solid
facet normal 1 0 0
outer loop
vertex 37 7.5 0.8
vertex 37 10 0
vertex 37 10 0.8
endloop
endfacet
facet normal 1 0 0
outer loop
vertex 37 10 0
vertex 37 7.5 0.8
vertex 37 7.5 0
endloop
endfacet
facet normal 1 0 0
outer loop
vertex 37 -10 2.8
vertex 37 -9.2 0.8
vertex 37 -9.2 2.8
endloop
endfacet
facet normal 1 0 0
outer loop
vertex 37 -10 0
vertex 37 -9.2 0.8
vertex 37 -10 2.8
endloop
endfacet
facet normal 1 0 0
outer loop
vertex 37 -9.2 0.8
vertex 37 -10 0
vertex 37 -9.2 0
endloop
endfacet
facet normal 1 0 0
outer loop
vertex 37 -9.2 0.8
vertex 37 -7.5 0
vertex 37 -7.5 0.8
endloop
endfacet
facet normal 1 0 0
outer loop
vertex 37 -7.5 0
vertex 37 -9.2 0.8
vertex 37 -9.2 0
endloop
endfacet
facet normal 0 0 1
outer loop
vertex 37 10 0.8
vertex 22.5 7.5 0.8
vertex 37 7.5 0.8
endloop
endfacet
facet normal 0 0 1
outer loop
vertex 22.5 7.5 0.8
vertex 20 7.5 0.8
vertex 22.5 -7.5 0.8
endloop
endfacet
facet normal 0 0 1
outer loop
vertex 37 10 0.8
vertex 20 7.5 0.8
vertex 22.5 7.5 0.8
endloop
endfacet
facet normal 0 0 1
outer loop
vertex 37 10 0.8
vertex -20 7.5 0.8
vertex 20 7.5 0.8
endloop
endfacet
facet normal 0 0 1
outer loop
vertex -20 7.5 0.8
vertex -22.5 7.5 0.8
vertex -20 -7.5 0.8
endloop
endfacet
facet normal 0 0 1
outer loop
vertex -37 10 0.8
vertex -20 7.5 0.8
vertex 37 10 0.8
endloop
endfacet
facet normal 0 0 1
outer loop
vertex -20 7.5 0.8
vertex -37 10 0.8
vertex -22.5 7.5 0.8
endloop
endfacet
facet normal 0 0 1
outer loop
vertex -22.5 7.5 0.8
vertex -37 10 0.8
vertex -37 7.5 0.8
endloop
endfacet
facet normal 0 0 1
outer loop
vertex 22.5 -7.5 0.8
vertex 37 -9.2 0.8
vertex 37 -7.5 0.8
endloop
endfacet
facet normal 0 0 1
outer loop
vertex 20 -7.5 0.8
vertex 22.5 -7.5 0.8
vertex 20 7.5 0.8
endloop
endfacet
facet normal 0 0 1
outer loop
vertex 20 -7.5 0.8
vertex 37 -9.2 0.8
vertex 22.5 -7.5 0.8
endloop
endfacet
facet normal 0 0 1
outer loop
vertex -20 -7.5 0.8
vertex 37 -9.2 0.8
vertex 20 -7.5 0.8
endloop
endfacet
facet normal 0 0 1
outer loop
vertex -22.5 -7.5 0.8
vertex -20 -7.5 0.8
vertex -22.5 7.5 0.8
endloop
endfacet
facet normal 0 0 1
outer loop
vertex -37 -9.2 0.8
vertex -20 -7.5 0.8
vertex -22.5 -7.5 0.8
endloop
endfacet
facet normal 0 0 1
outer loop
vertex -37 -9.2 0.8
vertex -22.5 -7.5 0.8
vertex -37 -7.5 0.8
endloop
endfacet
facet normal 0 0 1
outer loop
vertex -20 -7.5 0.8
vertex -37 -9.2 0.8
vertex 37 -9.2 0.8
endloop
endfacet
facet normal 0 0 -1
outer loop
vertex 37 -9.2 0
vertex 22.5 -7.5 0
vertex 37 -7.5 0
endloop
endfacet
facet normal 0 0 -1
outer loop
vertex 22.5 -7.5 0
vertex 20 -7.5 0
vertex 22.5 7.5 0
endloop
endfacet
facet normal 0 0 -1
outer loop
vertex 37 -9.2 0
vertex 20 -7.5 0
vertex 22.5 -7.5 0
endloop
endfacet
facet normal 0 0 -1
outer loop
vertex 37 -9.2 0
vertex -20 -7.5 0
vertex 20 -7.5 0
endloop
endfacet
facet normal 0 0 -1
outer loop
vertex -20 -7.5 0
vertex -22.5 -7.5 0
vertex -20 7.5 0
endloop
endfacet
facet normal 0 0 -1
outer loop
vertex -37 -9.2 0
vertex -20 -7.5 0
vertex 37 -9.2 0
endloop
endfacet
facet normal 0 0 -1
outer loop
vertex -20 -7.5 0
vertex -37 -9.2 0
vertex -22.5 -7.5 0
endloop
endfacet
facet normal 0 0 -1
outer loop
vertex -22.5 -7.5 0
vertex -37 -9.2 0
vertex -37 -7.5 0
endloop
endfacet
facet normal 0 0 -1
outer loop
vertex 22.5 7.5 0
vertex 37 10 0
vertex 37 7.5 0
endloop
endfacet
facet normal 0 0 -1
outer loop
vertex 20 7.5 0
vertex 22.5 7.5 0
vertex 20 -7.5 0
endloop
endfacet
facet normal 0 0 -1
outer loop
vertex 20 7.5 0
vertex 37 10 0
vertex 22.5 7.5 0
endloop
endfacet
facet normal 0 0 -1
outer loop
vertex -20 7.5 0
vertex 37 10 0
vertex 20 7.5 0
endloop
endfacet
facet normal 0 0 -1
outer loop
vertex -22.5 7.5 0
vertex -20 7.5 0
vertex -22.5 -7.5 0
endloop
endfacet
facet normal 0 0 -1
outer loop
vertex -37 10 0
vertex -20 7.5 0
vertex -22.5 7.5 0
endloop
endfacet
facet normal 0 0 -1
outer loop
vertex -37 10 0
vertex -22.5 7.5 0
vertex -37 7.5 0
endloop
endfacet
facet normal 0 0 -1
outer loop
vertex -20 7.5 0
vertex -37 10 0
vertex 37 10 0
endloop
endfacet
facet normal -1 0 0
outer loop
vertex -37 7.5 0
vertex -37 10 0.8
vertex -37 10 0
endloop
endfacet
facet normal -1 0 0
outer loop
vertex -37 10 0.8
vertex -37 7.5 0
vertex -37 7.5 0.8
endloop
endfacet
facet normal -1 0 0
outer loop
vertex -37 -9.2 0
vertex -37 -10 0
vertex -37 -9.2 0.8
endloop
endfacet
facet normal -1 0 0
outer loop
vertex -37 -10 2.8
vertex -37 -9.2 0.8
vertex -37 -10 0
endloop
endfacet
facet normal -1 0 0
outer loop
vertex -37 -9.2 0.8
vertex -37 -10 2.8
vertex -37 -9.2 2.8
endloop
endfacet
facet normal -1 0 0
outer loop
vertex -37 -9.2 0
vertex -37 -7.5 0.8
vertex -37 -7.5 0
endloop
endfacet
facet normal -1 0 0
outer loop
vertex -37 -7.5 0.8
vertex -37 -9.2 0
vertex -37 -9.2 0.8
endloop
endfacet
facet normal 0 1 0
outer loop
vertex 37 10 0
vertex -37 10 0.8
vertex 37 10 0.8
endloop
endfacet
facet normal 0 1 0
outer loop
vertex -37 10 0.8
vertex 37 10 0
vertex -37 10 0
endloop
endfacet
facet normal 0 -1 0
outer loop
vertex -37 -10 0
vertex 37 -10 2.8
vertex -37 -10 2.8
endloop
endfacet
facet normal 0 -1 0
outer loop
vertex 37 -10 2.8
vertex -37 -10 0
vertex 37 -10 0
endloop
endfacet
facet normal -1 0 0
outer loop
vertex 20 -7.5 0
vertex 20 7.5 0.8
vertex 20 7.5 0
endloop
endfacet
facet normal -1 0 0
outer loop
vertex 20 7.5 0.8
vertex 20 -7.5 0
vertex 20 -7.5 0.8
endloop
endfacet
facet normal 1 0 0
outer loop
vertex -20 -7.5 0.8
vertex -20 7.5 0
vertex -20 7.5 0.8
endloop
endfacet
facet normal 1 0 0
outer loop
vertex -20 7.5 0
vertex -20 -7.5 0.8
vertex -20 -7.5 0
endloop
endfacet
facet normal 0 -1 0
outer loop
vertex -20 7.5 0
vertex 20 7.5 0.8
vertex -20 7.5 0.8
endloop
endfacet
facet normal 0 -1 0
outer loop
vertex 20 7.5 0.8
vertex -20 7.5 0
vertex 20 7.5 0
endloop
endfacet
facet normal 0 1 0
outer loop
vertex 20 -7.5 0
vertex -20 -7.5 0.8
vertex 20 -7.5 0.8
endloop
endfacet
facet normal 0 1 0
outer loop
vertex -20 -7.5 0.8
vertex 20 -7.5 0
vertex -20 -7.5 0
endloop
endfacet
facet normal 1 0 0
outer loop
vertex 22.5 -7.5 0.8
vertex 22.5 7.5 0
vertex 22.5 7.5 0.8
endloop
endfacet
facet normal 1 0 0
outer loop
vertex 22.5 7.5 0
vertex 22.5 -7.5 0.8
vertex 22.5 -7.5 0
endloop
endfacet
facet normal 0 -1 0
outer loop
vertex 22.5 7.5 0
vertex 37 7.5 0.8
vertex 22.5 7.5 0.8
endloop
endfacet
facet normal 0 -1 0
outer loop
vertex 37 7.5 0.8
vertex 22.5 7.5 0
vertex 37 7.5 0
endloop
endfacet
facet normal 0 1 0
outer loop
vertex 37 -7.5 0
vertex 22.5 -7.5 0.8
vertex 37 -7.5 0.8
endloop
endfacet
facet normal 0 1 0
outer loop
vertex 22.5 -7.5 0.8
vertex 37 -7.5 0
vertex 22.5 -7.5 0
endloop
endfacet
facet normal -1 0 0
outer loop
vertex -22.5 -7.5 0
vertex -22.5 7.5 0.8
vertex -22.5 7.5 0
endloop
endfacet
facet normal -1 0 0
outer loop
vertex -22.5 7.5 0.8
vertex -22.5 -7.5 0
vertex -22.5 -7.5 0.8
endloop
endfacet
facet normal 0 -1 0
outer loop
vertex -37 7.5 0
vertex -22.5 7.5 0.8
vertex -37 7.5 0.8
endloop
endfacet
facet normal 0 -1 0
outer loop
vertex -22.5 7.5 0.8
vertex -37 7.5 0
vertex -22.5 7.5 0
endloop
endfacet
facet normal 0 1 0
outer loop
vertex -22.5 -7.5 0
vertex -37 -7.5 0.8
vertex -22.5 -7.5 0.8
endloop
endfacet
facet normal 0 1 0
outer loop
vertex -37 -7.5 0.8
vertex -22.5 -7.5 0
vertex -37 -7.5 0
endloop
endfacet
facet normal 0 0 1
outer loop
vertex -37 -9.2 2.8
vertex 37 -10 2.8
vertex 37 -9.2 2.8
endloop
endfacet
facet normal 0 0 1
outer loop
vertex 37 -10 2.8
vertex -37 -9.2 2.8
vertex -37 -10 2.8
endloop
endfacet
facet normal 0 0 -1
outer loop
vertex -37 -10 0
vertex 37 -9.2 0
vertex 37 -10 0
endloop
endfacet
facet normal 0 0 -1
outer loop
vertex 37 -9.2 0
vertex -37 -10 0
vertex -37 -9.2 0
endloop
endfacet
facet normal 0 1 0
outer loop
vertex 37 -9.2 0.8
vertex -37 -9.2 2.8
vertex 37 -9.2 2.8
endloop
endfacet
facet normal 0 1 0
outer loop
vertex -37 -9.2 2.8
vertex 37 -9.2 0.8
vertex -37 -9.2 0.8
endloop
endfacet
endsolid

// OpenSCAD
translate([0,0,0.4]) difference() {
cube([74,20,0.8],true);
cube([40,15,1],true);    
translate([30,0,0]) cube([15,15,1],true);
translate([-30,0,0]) cube([15,15,1],true);
}
translate([0,-9.6,1.4]) cube([74,0.8,2.8],true);
